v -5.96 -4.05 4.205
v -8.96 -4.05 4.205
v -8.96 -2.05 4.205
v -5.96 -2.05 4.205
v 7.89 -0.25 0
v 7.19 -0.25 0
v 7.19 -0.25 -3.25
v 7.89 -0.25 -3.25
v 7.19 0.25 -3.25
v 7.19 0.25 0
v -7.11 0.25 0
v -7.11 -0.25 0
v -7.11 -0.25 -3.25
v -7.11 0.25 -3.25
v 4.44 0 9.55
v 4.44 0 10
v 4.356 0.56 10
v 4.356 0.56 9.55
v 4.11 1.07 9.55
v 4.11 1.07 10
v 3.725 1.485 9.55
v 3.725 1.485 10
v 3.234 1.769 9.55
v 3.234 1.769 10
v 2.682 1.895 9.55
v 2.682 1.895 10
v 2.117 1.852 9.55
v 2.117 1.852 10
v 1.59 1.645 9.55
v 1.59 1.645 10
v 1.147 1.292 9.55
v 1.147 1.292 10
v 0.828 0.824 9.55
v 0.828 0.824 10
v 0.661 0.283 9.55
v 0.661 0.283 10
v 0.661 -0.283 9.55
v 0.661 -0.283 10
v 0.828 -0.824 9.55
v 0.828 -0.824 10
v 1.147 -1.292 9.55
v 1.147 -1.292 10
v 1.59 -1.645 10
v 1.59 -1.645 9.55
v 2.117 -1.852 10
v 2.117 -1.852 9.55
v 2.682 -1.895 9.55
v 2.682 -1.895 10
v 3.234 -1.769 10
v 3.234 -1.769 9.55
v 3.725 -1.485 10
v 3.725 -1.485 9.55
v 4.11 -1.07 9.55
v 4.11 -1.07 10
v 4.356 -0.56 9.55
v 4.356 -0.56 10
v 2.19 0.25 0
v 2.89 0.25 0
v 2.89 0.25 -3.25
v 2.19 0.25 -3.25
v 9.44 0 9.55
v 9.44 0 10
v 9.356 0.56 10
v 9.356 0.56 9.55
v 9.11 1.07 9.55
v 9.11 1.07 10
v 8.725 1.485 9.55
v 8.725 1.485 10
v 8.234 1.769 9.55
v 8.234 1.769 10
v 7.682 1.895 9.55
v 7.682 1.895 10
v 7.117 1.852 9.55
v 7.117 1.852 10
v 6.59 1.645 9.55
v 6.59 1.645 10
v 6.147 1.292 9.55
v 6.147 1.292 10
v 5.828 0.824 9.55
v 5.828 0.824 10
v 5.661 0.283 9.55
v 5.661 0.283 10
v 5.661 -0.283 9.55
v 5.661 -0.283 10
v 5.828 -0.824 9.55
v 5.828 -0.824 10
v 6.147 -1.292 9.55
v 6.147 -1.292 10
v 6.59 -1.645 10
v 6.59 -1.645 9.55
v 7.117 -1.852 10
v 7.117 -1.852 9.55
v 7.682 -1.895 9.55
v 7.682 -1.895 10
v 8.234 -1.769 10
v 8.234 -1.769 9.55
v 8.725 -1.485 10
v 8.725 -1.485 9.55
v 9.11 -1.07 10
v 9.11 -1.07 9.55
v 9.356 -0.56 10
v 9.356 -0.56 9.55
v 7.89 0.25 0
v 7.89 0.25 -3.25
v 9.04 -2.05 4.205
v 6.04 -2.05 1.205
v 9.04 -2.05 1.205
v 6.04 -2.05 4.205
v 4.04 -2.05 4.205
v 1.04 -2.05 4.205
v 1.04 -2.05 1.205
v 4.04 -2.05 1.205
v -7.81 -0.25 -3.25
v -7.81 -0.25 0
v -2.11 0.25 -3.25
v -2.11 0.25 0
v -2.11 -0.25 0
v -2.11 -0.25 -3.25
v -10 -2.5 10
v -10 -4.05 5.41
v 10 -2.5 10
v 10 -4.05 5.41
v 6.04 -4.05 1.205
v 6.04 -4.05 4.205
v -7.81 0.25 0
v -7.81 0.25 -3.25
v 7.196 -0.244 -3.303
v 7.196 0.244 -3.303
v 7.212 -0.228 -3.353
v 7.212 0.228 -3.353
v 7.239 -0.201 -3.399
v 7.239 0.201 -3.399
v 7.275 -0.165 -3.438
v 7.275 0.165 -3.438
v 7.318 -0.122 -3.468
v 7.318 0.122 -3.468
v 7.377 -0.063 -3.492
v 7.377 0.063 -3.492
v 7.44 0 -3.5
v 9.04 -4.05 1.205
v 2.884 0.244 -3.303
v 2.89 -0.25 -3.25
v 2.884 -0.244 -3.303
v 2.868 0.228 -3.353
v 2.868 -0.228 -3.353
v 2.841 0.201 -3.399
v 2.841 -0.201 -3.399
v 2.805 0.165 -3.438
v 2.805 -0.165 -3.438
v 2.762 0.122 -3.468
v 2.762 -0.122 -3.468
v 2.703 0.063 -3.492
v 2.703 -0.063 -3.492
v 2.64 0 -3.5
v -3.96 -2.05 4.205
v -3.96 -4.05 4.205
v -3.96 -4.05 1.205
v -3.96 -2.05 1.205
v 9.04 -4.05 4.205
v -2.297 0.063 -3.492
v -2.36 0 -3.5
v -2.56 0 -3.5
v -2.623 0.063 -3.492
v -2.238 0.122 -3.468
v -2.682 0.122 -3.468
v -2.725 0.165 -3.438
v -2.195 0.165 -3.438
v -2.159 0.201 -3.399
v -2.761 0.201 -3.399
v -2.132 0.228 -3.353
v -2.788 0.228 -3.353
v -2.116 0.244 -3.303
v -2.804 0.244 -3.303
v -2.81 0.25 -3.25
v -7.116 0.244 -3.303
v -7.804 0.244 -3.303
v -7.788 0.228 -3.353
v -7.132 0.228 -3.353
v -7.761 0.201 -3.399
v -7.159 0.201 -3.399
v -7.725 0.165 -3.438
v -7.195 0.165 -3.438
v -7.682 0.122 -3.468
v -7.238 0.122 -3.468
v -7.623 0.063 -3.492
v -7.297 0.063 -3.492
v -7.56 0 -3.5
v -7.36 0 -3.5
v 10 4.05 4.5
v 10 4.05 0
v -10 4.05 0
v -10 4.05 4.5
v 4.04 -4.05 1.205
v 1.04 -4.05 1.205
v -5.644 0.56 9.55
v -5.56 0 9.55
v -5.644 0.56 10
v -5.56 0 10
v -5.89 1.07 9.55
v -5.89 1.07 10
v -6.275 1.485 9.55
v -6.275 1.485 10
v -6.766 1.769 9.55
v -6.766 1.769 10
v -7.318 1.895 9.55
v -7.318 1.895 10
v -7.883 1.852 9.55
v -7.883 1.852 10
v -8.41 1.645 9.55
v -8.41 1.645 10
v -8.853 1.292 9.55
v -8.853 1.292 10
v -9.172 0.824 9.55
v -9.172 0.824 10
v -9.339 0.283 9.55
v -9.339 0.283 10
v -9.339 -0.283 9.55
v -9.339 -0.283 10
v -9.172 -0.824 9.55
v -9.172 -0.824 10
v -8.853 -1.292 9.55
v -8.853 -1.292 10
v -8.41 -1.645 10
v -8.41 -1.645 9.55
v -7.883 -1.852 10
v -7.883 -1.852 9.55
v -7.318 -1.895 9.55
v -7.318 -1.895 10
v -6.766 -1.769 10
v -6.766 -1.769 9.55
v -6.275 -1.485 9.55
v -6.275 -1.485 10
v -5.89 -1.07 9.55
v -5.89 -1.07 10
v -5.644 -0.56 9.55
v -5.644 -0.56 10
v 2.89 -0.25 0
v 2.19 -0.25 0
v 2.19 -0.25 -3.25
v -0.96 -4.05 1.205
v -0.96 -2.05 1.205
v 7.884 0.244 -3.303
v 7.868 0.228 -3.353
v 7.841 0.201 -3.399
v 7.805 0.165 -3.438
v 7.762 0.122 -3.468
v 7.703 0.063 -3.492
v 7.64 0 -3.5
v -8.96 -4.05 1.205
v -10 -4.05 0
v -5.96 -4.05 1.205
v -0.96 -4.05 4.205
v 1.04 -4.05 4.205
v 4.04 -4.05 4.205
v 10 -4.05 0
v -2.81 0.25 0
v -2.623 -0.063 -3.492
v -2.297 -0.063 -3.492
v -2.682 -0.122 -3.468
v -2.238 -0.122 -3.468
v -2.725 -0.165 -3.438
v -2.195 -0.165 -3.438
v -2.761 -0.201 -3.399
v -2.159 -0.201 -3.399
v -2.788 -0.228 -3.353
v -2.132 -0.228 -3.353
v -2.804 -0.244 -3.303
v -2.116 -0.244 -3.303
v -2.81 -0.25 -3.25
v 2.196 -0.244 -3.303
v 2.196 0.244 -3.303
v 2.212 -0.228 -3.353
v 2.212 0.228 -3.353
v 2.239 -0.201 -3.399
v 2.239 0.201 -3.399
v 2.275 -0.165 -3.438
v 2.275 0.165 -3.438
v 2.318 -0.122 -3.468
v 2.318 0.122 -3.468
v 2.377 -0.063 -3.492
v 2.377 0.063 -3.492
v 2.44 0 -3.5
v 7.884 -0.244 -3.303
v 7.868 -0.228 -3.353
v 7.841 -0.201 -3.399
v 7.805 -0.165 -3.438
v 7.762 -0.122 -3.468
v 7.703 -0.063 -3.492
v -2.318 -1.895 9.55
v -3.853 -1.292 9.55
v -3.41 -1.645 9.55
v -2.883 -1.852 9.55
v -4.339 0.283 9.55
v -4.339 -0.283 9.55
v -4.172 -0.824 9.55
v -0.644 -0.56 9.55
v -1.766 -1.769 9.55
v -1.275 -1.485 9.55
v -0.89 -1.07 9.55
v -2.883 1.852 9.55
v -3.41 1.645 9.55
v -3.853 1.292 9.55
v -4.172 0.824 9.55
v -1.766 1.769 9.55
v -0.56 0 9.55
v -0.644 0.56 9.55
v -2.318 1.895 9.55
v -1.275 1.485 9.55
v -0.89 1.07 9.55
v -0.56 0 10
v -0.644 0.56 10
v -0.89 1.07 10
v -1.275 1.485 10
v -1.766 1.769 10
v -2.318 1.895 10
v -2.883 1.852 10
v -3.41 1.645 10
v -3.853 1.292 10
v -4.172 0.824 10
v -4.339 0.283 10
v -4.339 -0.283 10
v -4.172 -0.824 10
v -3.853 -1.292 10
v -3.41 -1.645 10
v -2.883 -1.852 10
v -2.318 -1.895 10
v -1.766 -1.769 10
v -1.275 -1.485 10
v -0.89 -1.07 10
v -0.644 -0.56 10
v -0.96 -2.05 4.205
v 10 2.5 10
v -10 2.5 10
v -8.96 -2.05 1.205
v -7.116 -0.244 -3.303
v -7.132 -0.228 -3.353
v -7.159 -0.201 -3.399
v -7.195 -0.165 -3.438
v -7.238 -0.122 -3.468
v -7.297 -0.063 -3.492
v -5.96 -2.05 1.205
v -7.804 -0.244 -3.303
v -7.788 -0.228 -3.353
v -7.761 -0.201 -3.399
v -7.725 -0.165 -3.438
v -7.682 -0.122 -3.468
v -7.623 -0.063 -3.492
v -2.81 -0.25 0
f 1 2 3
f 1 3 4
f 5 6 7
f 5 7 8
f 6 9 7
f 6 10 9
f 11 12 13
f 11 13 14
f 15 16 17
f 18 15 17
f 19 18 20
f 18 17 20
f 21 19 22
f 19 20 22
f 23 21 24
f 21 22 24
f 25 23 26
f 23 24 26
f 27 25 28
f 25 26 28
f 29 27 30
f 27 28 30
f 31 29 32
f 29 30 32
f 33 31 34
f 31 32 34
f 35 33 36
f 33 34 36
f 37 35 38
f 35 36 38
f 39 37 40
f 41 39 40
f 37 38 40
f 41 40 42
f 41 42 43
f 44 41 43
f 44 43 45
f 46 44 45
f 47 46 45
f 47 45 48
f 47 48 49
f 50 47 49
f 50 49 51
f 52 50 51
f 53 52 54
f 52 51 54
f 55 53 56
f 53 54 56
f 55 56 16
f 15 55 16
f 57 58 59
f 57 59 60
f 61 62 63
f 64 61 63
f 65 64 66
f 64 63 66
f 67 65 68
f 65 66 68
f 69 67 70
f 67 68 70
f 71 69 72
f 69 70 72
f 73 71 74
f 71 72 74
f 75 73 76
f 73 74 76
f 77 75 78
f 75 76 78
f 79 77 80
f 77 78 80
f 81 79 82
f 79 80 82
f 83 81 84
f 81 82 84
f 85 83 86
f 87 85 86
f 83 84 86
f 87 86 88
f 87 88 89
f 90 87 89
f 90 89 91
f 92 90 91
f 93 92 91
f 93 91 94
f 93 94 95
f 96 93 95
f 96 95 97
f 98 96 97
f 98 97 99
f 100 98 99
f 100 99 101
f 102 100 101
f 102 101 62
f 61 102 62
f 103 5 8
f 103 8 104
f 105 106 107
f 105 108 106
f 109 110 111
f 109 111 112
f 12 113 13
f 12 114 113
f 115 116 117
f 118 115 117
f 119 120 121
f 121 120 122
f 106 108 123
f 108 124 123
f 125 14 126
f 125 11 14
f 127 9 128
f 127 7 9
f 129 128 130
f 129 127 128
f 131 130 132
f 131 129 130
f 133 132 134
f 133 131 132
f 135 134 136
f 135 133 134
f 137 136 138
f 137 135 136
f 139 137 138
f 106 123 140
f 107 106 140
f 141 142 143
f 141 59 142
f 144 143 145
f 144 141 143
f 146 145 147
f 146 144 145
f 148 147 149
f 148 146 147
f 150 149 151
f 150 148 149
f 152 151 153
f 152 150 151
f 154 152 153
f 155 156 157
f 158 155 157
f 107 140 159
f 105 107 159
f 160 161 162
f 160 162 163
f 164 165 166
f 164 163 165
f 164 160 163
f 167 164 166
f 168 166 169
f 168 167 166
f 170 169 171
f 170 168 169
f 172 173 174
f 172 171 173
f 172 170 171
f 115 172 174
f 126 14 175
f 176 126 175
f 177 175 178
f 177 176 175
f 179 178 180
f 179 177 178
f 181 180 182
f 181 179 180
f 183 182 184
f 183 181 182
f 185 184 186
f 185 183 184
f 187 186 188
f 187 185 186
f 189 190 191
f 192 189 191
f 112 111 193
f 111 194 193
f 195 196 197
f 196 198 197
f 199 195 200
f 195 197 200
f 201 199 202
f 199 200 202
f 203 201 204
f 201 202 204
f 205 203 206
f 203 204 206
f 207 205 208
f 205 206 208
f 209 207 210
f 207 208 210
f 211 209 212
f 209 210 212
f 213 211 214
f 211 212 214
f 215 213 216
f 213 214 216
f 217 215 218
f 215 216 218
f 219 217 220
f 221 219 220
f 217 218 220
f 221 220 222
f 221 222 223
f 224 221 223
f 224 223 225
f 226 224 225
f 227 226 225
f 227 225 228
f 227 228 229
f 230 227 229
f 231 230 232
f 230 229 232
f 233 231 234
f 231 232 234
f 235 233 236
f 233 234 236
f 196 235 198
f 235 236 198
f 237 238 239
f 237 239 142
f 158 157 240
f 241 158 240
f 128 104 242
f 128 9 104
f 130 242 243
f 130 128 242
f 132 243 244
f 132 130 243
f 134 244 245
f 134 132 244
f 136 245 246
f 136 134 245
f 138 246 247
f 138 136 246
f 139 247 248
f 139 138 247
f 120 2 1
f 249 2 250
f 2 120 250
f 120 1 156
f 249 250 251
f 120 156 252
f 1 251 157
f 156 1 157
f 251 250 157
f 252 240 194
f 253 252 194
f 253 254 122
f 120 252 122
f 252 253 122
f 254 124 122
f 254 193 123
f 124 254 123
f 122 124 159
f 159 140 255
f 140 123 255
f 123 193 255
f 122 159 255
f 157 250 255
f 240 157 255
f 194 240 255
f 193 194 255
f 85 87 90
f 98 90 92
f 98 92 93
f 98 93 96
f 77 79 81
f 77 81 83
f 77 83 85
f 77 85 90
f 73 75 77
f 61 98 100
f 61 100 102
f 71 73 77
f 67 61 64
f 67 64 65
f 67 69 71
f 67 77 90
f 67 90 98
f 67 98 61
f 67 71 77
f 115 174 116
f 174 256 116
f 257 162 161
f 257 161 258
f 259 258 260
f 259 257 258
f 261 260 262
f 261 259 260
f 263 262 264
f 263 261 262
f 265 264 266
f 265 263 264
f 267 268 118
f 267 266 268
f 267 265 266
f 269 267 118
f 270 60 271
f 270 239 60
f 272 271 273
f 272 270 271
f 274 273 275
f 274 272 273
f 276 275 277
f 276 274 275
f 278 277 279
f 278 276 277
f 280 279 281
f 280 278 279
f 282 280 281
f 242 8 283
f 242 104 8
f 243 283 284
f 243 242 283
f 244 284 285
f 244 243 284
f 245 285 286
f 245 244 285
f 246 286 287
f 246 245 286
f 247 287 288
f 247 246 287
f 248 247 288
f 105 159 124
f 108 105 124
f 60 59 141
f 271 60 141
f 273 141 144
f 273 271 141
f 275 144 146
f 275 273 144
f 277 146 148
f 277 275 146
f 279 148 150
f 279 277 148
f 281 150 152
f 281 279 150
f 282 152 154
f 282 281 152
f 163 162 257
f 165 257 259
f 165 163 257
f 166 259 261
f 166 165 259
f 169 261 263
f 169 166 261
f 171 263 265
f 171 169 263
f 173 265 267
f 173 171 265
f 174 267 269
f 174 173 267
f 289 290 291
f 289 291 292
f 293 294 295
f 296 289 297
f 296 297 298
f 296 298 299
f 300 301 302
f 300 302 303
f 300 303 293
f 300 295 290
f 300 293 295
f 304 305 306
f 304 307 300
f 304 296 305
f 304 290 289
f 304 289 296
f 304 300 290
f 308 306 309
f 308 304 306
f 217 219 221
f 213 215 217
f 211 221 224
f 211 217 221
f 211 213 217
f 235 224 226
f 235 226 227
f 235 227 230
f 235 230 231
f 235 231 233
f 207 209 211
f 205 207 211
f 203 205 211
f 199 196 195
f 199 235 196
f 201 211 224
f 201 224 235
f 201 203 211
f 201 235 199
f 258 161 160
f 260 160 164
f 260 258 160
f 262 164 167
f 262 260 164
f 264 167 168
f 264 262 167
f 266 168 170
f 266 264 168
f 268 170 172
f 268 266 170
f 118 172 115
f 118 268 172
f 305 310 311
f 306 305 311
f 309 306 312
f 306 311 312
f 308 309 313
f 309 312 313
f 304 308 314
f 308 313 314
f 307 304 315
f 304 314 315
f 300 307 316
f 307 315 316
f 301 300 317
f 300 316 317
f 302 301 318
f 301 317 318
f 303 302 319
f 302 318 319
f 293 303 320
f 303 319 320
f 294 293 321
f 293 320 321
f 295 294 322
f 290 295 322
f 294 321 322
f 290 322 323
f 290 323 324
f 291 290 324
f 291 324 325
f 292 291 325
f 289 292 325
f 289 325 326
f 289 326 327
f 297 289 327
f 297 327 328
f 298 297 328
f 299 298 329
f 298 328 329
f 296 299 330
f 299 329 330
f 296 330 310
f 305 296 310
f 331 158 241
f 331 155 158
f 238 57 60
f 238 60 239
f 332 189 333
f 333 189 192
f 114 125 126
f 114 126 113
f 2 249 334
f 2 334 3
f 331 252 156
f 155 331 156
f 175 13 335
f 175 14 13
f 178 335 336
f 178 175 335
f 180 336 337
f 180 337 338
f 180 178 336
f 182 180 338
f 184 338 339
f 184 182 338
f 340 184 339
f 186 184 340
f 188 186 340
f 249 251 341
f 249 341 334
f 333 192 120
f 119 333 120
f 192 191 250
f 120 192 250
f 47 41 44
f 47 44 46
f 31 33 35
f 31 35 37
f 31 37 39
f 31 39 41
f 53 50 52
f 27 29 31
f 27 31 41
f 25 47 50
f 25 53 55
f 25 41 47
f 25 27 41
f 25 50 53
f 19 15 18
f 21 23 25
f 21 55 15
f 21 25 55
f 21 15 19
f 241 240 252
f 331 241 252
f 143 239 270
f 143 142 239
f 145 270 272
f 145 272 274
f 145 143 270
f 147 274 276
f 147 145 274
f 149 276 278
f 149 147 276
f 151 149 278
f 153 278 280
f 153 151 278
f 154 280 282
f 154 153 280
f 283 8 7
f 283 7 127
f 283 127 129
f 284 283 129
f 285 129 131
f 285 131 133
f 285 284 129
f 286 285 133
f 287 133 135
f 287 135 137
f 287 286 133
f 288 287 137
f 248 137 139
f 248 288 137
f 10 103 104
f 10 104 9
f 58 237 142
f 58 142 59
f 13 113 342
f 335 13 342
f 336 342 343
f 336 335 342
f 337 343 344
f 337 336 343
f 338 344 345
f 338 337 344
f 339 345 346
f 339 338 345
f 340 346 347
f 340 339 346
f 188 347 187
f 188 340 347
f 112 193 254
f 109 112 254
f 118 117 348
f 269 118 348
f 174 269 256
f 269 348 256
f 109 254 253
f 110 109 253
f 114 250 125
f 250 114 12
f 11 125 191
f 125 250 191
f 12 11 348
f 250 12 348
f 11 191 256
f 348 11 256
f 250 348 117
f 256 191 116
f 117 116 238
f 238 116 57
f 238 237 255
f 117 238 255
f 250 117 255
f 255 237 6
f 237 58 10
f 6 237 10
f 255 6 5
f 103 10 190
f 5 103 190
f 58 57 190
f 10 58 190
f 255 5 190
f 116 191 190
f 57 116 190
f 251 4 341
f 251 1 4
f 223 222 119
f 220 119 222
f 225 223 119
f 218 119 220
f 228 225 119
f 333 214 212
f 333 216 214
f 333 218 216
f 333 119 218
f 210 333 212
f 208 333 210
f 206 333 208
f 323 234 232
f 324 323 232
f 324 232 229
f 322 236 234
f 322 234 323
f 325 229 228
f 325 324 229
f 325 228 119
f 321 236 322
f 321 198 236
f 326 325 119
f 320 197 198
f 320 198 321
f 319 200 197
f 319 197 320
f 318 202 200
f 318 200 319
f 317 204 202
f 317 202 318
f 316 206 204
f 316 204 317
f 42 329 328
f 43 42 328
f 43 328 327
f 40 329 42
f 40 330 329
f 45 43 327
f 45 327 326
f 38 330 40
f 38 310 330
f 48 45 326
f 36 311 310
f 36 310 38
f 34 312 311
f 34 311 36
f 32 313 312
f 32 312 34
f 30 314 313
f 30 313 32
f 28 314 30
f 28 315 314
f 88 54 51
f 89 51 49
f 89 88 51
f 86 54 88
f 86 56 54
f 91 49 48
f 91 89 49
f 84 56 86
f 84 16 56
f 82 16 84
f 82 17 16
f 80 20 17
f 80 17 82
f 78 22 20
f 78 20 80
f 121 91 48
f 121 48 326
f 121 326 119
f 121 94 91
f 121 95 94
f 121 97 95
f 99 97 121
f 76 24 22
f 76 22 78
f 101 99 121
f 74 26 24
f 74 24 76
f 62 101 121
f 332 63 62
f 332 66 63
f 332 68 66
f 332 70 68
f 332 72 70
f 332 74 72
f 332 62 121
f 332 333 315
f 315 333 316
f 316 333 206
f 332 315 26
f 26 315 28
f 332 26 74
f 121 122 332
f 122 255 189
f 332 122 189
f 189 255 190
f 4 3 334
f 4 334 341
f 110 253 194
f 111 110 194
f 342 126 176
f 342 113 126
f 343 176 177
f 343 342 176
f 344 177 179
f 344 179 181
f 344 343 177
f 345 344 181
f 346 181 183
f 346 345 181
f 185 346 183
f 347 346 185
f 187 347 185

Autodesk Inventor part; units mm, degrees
ref_plane "YZ Plane" through (0, 0, 0) normal (1, 0, 0) x (0, 1, 0)
ref_plane "XZ Plane" through (0, 0, 0) normal (0, 1, 0) x (-1, 0, 0)
ref_plane "XY Plane" through (0, 0, 0) normal (0, 0, 1) x (1, 0, 0)
sketch "Skizze1" plane through (0, 0, 0) normal (0, 0, 1) x (1, 0, 0)
  line L0 (-10, -4.05) -> (10, -4.05)
  line L1 (10, -4.05) -> (10, 4.05)
  line L2 (10, 4.05) -> (-10, 4.05)
  line L3 (-10, 4.05) -> (-10, -4.05)
  line L4 (-10, -4.05) -> (10, 4.05) construction
  line L5 (10, -4.05) -> (-10, 4.05) construction
  point P0 (0, 0)
  dimension "d0" = 20
  dimension "d1" = 8.1
extrude "Extrusion1" add sketch "Skizze1" along normal blind 10
sketch "Skizze2" plane through (0, 0, 10) normal (0, 0, 1) x (1, 0, 0)
  circle A0 centre (-7.46, 0) radius 1.9
  circle A1 centre (-2.46, 0) radius 1.9
  line L0 (-10, 4.05) -> (-10, -4.05) projected
  circle A2 centre (2.54, 0) radius 1.9
  circle A3 centre (7.54, 0) radius 1.9
  point P0 (0, 0)
  point P1 (-10, 0)
  dimension "d6" = 3.8
  dimension "d7" = 3.8
  dimension "d56" = 2.54
  dimension "d57" = 5
  dimension "d58" = 3.8
  dimension "d59" = 3.8
  dimension "d60" = 5
  dimension "d61" = 5
extrude "Extrusion2" cut sketch "Skizze2" against normal blind 0.45
chamfer "Fasen1" distance 1.55 distance2 4.59 1 edges at (0, -4.05, 10) measured on face at (-0.7437, -3.3287, 10)
chamfer "Fasen2" distance 1.55 distance2 5.5 1 edges at (0, 4.05, 10) measured on face at (0.7703, 3.3287, 10)
sketch "Skizze3" plane through (0, 0, 0) normal (0, 0, -1) x (-1, 0, 0)
  line L0 (2.81, 0.25) -> (2.11, 0.25)
  line L1 (2.11, 0.25) -> (2.11, -0.25)
  line L2 (2.11, -0.25) -> (2.81, -0.25)
  line L3 (2.81, -0.25) -> (2.81, 0.25)
  line L4 (2.81, 0.25) -> (2.11, -0.25) construction
  line L5 (2.11, 0.25) -> (2.81, -0.25) construction
  line L6 (7.11, 0.25) -> (7.81, 0.25)
  line L7 (7.81, 0.25) -> (7.81, -0.25)
  line L8 (7.81, -0.25) -> (7.11, -0.25)
  line L9 (7.11, -0.25) -> (7.11, 0.25)
  line L10 (7.11, 0.25) -> (7.81, -0.25) construction
  line L11 (7.81, 0.25) -> (7.11, -0.25) construction
  line L12 (10, 4.05) -> (10, -4.05) projected
  line L13 (-2.19, -0.25) -> (-2.89, -0.25)
  line L14 (-2.89, -0.25) -> (-2.89, 0.25)
  line L15 (-2.89, 0.25) -> (-2.19, 0.25)
  line L16 (-2.19, 0.25) -> (-2.19, -0.25)
  line L17 (-2.19, -0.25) -> (-2.89, 0.25) construction
  line L18 (-2.89, -0.25) -> (-2.19, 0.25) construction
  line L19 (-7.19, -0.25) -> (-7.89, -0.25)
  line L20 (-7.89, -0.25) -> (-7.89, 0.25)
  line L21 (-7.89, 0.25) -> (-7.19, 0.25)
  line L22 (-7.19, 0.25) -> (-7.19, -0.25)
  line L23 (-7.19, -0.25) -> (-7.89, 0.25) construction
  line L24 (-7.89, -0.25) -> (-7.19, 0.25) construction
  point P0 (2.46, 0)
  point P1 (7.46, 0)
  point P2 (-2.54, 0)
  point P3 (-7.54, 0)
  dimension "d18" = 0.7
  dimension "d19" = 0.5
  dimension "d20" = 0.7
  dimension "d21" = 0.5
  dimension "d43" = 2.54
  dimension "d45" = 5
  dimension "d48" = 0.7
  dimension "d49" = 0.5
  dimension "d50" = 5
  dimension "d51" = 0.7
  dimension "d52" = 0.5
  dimension "d53" = 5
extrude "Extrusion3" add sketch "Skizze3" along normal blind 3.5
fillet "Rundung1" radius 0.25 16 edges at (-7.81, 0, -3.5) (-7.11, 0, -3.5) (-7.46, -0.25, -3.5) (-7.46, 0.25, -3.5) (-2.46, -0.25, -3.5) (-2.81, 0, -3.5) (-2.46, 0.25, -3.5) (-2.11, 0, -3.5) (2.54, -0.25, -3.5) (2.19, 0, -3.5) (2.54, 0.25, -3.5) (2.89, 0, -3.5) (7.54, -0.25, -3.5) (7.89, 0, -3.5) (7.54, 0.25, -3.5) (7.19, 0, -3.5)
sketch "Skizze5" plane through (-10, -4.05, 0) normal (0, -1, 0) x (1, 0, 0)
  line L0 (4.04, 1.205) -> (1.04, 1.205)
  line L1 (1.04, 1.205) -> (1.04, 4.205)
  line L2 (1.04, 4.205) -> (4.04, 4.205)
  line L3 (4.04, 4.205) -> (4.04, 1.205)
  line L4 (4.04, 1.205) -> (1.04, 4.205) construction
  line L5 (1.04, 1.205) -> (4.04, 4.205) construction
  line L6 (6.04, 1.205) -> (9.04, 1.205)
  line L7 (9.04, 1.205) -> (9.04, 4.205)
  line L8 (9.04, 4.205) -> (6.04, 4.205)
  line L9 (6.04, 4.205) -> (6.04, 1.205)
  line L10 (6.04, 1.205) -> (9.04, 4.205) construction
  line L11 (9.04, 1.205) -> (6.04, 4.205) construction
  line L12 (11.04, 1.205) -> (14.04, 1.205)
  line L13 (14.04, 1.205) -> (14.04, 4.205)
  line L14 (14.04, 4.205) -> (11.04, 4.205)
  line L15 (11.04, 4.205) -> (11.04, 1.205)
  line L16 (11.04, 1.205) -> (14.04, 4.205) construction
  line L17 (14.04, 1.205) -> (11.04, 4.205) construction
  line L18 (0, 0) -> (0, 5.41) projected
  line L19 (16.04, 1.205) -> (19.04, 1.205)
  line L20 (19.04, 1.205) -> (19.04, 4.205)
  line L21 (19.04, 4.205) -> (16.04, 4.205)
  line L22 (16.04, 4.205) -> (16.04, 1.205)
  line L23 (16.04, 1.205) -> (19.04, 4.205) construction
  line L24 (19.04, 1.205) -> (16.04, 4.205) construction
  point P0 (10, 0)
  point P1 (2.54, 2.705)
  point P2 (7.54, 2.705)
  point P3 (12.54, 2.705)
  point P4 (17.54, 2.705)
  dimension "d27" = 3
  dimension "d28" = 3
  dimension "d29" = 3
  dimension "d30" = 3
  dimension "d31" = 3
  dimension "d32" = 3
  dimension "d33" = 2.54
  dimension "d34" = 5
  dimension "d35" = 5
  dimension "d40" = 3
  dimension "d41" = 3
  dimension "d42" = 5
extrude "Extrusion5" cut sketch "Skizze5" against normal blind 2
properties part number "Schraubklemme_1x3"
